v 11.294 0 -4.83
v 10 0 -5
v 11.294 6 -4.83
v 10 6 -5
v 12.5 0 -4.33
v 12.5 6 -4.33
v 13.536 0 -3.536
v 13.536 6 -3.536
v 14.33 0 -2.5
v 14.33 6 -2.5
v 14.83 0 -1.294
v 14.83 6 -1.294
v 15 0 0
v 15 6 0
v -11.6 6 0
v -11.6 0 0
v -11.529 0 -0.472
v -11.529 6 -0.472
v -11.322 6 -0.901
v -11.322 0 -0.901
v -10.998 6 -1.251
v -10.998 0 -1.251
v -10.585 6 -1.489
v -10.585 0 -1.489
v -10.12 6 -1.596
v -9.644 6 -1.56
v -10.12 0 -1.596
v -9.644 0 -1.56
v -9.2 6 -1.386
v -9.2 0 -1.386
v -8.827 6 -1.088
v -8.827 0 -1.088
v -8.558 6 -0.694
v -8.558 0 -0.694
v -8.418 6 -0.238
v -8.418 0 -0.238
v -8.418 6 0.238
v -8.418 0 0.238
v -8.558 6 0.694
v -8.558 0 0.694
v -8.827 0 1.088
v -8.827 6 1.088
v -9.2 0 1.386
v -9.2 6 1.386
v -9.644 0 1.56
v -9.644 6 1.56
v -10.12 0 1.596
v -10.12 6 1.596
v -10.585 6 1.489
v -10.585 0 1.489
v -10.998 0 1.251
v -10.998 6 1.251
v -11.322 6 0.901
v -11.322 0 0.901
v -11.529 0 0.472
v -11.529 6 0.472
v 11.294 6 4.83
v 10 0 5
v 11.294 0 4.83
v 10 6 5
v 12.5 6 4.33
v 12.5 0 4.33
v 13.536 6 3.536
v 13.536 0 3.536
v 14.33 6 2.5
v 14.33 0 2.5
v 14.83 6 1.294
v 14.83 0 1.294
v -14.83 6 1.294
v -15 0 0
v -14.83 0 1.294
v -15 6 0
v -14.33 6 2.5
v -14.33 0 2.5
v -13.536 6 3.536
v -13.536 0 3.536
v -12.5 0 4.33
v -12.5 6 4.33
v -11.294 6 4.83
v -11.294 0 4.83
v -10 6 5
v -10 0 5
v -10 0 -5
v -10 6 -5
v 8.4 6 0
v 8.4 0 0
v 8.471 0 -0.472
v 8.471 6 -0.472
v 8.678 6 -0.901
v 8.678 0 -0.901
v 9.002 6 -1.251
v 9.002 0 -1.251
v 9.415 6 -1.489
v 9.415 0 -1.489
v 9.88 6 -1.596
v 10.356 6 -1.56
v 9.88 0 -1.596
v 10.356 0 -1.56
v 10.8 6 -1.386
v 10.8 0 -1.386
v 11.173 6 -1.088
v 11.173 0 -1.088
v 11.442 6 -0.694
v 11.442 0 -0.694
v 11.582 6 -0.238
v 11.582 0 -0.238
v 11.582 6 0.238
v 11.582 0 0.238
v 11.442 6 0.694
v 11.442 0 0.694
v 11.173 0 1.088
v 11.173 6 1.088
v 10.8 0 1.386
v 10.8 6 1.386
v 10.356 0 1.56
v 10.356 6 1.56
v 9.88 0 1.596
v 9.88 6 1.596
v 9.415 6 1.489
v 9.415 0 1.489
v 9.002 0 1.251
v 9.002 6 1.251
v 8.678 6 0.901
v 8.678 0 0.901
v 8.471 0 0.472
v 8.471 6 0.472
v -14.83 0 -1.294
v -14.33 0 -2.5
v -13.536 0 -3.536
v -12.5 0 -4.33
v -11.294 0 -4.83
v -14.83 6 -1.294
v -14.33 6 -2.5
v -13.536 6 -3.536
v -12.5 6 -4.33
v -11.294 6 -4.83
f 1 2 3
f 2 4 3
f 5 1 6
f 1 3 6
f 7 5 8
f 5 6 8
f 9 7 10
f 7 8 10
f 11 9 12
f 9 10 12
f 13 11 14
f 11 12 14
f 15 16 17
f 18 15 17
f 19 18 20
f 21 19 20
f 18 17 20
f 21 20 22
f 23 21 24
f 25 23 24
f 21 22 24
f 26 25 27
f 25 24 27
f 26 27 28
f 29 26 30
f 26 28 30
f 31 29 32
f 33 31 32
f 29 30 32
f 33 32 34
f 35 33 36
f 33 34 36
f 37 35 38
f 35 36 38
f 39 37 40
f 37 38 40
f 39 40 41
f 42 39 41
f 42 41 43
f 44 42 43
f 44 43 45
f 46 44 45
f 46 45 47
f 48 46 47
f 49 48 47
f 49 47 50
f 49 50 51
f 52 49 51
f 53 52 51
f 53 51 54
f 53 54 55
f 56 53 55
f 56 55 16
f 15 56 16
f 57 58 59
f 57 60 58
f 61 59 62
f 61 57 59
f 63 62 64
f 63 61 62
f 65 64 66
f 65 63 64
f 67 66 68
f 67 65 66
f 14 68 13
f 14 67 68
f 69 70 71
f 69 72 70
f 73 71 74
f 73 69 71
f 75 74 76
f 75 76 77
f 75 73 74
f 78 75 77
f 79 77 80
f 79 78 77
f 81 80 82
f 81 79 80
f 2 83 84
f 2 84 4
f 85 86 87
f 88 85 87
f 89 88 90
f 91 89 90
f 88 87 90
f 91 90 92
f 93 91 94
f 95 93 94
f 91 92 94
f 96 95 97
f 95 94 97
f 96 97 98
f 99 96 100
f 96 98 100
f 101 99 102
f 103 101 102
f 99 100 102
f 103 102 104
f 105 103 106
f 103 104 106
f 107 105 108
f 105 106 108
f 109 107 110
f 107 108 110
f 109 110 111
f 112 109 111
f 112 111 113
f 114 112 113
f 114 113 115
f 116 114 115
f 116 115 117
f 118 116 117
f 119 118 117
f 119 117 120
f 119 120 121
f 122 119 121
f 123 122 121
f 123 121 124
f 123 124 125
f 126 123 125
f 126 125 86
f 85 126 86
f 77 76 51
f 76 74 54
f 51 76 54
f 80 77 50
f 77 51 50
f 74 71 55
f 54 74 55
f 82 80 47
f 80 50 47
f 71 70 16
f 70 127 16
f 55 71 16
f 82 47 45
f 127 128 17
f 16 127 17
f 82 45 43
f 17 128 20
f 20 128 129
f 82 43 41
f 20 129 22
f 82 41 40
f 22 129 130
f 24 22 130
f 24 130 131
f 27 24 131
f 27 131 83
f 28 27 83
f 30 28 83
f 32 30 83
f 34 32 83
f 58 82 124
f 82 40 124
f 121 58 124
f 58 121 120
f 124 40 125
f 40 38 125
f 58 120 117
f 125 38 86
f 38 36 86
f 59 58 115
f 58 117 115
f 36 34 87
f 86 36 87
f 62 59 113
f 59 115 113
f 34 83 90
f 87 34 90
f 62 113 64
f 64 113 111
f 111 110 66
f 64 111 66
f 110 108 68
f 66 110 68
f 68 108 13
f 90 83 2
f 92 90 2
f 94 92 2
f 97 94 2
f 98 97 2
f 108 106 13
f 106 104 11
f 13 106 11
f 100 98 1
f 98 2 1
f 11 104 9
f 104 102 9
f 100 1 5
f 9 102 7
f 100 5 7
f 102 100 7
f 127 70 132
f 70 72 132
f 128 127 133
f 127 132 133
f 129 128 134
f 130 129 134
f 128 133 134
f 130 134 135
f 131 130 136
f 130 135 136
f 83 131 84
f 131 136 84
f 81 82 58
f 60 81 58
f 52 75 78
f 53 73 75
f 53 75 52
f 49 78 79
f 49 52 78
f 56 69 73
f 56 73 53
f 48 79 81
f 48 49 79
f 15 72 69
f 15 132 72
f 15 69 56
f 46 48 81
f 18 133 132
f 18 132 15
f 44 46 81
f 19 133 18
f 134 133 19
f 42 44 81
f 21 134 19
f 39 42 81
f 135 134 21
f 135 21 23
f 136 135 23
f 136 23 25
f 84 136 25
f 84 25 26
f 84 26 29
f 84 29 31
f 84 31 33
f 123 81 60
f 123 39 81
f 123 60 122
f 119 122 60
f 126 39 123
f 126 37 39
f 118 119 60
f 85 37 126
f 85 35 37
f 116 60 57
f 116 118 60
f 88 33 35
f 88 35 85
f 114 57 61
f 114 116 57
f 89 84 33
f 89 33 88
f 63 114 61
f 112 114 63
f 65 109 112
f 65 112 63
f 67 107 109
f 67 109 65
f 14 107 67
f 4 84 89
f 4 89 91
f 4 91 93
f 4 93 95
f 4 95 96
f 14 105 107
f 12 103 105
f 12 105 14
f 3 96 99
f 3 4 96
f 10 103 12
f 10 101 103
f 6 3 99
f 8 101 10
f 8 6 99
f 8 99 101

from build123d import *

# Parameters (mm, degrees)
SKETCH2_W            = 30
SKETCH2_H            = 10
BOSS_EXTRUDE1_DEPTH  = 6
M3_CLEARANCE_HOLE1_D = 3.2
FILLET1_R            = 5


with BuildPart() as part:
    # Sketch2 → Boss-Extrude1 (new body)
    with BuildSketch(Plane(origin=(0, 0, 0), x_dir=(1, 0, 0), z_dir=(0, 1, 0))):
        Rectangle(SKETCH2_W, SKETCH2_H)
    extrude(amount=BOSS_EXTRUDE1_DEPTH)

    # M3 Clearance Hole1 (through all)
    with Locations(Plane(origin=(0, 6, 0), x_dir=(1, 0, 0), z_dir=(0, 1, 0))):
        with Locations((-10, 0), (10, 0)):
            Hole(M3_CLEARANCE_HOLE1_D / 2)

    # Fillet1
    fillet1_edges = [part.edges().sort_by_distance(p)[0] for p in [
        (15, 3, -5),
        (15, 3, 5),
        (-15, 3, 5),
        (-15, 3, -5),
    ]]
    fillet(fillet1_edges, radius=FILLET1_R - 0.0001)  # a hair under: the kernel refuses the full size


solid = part.part
